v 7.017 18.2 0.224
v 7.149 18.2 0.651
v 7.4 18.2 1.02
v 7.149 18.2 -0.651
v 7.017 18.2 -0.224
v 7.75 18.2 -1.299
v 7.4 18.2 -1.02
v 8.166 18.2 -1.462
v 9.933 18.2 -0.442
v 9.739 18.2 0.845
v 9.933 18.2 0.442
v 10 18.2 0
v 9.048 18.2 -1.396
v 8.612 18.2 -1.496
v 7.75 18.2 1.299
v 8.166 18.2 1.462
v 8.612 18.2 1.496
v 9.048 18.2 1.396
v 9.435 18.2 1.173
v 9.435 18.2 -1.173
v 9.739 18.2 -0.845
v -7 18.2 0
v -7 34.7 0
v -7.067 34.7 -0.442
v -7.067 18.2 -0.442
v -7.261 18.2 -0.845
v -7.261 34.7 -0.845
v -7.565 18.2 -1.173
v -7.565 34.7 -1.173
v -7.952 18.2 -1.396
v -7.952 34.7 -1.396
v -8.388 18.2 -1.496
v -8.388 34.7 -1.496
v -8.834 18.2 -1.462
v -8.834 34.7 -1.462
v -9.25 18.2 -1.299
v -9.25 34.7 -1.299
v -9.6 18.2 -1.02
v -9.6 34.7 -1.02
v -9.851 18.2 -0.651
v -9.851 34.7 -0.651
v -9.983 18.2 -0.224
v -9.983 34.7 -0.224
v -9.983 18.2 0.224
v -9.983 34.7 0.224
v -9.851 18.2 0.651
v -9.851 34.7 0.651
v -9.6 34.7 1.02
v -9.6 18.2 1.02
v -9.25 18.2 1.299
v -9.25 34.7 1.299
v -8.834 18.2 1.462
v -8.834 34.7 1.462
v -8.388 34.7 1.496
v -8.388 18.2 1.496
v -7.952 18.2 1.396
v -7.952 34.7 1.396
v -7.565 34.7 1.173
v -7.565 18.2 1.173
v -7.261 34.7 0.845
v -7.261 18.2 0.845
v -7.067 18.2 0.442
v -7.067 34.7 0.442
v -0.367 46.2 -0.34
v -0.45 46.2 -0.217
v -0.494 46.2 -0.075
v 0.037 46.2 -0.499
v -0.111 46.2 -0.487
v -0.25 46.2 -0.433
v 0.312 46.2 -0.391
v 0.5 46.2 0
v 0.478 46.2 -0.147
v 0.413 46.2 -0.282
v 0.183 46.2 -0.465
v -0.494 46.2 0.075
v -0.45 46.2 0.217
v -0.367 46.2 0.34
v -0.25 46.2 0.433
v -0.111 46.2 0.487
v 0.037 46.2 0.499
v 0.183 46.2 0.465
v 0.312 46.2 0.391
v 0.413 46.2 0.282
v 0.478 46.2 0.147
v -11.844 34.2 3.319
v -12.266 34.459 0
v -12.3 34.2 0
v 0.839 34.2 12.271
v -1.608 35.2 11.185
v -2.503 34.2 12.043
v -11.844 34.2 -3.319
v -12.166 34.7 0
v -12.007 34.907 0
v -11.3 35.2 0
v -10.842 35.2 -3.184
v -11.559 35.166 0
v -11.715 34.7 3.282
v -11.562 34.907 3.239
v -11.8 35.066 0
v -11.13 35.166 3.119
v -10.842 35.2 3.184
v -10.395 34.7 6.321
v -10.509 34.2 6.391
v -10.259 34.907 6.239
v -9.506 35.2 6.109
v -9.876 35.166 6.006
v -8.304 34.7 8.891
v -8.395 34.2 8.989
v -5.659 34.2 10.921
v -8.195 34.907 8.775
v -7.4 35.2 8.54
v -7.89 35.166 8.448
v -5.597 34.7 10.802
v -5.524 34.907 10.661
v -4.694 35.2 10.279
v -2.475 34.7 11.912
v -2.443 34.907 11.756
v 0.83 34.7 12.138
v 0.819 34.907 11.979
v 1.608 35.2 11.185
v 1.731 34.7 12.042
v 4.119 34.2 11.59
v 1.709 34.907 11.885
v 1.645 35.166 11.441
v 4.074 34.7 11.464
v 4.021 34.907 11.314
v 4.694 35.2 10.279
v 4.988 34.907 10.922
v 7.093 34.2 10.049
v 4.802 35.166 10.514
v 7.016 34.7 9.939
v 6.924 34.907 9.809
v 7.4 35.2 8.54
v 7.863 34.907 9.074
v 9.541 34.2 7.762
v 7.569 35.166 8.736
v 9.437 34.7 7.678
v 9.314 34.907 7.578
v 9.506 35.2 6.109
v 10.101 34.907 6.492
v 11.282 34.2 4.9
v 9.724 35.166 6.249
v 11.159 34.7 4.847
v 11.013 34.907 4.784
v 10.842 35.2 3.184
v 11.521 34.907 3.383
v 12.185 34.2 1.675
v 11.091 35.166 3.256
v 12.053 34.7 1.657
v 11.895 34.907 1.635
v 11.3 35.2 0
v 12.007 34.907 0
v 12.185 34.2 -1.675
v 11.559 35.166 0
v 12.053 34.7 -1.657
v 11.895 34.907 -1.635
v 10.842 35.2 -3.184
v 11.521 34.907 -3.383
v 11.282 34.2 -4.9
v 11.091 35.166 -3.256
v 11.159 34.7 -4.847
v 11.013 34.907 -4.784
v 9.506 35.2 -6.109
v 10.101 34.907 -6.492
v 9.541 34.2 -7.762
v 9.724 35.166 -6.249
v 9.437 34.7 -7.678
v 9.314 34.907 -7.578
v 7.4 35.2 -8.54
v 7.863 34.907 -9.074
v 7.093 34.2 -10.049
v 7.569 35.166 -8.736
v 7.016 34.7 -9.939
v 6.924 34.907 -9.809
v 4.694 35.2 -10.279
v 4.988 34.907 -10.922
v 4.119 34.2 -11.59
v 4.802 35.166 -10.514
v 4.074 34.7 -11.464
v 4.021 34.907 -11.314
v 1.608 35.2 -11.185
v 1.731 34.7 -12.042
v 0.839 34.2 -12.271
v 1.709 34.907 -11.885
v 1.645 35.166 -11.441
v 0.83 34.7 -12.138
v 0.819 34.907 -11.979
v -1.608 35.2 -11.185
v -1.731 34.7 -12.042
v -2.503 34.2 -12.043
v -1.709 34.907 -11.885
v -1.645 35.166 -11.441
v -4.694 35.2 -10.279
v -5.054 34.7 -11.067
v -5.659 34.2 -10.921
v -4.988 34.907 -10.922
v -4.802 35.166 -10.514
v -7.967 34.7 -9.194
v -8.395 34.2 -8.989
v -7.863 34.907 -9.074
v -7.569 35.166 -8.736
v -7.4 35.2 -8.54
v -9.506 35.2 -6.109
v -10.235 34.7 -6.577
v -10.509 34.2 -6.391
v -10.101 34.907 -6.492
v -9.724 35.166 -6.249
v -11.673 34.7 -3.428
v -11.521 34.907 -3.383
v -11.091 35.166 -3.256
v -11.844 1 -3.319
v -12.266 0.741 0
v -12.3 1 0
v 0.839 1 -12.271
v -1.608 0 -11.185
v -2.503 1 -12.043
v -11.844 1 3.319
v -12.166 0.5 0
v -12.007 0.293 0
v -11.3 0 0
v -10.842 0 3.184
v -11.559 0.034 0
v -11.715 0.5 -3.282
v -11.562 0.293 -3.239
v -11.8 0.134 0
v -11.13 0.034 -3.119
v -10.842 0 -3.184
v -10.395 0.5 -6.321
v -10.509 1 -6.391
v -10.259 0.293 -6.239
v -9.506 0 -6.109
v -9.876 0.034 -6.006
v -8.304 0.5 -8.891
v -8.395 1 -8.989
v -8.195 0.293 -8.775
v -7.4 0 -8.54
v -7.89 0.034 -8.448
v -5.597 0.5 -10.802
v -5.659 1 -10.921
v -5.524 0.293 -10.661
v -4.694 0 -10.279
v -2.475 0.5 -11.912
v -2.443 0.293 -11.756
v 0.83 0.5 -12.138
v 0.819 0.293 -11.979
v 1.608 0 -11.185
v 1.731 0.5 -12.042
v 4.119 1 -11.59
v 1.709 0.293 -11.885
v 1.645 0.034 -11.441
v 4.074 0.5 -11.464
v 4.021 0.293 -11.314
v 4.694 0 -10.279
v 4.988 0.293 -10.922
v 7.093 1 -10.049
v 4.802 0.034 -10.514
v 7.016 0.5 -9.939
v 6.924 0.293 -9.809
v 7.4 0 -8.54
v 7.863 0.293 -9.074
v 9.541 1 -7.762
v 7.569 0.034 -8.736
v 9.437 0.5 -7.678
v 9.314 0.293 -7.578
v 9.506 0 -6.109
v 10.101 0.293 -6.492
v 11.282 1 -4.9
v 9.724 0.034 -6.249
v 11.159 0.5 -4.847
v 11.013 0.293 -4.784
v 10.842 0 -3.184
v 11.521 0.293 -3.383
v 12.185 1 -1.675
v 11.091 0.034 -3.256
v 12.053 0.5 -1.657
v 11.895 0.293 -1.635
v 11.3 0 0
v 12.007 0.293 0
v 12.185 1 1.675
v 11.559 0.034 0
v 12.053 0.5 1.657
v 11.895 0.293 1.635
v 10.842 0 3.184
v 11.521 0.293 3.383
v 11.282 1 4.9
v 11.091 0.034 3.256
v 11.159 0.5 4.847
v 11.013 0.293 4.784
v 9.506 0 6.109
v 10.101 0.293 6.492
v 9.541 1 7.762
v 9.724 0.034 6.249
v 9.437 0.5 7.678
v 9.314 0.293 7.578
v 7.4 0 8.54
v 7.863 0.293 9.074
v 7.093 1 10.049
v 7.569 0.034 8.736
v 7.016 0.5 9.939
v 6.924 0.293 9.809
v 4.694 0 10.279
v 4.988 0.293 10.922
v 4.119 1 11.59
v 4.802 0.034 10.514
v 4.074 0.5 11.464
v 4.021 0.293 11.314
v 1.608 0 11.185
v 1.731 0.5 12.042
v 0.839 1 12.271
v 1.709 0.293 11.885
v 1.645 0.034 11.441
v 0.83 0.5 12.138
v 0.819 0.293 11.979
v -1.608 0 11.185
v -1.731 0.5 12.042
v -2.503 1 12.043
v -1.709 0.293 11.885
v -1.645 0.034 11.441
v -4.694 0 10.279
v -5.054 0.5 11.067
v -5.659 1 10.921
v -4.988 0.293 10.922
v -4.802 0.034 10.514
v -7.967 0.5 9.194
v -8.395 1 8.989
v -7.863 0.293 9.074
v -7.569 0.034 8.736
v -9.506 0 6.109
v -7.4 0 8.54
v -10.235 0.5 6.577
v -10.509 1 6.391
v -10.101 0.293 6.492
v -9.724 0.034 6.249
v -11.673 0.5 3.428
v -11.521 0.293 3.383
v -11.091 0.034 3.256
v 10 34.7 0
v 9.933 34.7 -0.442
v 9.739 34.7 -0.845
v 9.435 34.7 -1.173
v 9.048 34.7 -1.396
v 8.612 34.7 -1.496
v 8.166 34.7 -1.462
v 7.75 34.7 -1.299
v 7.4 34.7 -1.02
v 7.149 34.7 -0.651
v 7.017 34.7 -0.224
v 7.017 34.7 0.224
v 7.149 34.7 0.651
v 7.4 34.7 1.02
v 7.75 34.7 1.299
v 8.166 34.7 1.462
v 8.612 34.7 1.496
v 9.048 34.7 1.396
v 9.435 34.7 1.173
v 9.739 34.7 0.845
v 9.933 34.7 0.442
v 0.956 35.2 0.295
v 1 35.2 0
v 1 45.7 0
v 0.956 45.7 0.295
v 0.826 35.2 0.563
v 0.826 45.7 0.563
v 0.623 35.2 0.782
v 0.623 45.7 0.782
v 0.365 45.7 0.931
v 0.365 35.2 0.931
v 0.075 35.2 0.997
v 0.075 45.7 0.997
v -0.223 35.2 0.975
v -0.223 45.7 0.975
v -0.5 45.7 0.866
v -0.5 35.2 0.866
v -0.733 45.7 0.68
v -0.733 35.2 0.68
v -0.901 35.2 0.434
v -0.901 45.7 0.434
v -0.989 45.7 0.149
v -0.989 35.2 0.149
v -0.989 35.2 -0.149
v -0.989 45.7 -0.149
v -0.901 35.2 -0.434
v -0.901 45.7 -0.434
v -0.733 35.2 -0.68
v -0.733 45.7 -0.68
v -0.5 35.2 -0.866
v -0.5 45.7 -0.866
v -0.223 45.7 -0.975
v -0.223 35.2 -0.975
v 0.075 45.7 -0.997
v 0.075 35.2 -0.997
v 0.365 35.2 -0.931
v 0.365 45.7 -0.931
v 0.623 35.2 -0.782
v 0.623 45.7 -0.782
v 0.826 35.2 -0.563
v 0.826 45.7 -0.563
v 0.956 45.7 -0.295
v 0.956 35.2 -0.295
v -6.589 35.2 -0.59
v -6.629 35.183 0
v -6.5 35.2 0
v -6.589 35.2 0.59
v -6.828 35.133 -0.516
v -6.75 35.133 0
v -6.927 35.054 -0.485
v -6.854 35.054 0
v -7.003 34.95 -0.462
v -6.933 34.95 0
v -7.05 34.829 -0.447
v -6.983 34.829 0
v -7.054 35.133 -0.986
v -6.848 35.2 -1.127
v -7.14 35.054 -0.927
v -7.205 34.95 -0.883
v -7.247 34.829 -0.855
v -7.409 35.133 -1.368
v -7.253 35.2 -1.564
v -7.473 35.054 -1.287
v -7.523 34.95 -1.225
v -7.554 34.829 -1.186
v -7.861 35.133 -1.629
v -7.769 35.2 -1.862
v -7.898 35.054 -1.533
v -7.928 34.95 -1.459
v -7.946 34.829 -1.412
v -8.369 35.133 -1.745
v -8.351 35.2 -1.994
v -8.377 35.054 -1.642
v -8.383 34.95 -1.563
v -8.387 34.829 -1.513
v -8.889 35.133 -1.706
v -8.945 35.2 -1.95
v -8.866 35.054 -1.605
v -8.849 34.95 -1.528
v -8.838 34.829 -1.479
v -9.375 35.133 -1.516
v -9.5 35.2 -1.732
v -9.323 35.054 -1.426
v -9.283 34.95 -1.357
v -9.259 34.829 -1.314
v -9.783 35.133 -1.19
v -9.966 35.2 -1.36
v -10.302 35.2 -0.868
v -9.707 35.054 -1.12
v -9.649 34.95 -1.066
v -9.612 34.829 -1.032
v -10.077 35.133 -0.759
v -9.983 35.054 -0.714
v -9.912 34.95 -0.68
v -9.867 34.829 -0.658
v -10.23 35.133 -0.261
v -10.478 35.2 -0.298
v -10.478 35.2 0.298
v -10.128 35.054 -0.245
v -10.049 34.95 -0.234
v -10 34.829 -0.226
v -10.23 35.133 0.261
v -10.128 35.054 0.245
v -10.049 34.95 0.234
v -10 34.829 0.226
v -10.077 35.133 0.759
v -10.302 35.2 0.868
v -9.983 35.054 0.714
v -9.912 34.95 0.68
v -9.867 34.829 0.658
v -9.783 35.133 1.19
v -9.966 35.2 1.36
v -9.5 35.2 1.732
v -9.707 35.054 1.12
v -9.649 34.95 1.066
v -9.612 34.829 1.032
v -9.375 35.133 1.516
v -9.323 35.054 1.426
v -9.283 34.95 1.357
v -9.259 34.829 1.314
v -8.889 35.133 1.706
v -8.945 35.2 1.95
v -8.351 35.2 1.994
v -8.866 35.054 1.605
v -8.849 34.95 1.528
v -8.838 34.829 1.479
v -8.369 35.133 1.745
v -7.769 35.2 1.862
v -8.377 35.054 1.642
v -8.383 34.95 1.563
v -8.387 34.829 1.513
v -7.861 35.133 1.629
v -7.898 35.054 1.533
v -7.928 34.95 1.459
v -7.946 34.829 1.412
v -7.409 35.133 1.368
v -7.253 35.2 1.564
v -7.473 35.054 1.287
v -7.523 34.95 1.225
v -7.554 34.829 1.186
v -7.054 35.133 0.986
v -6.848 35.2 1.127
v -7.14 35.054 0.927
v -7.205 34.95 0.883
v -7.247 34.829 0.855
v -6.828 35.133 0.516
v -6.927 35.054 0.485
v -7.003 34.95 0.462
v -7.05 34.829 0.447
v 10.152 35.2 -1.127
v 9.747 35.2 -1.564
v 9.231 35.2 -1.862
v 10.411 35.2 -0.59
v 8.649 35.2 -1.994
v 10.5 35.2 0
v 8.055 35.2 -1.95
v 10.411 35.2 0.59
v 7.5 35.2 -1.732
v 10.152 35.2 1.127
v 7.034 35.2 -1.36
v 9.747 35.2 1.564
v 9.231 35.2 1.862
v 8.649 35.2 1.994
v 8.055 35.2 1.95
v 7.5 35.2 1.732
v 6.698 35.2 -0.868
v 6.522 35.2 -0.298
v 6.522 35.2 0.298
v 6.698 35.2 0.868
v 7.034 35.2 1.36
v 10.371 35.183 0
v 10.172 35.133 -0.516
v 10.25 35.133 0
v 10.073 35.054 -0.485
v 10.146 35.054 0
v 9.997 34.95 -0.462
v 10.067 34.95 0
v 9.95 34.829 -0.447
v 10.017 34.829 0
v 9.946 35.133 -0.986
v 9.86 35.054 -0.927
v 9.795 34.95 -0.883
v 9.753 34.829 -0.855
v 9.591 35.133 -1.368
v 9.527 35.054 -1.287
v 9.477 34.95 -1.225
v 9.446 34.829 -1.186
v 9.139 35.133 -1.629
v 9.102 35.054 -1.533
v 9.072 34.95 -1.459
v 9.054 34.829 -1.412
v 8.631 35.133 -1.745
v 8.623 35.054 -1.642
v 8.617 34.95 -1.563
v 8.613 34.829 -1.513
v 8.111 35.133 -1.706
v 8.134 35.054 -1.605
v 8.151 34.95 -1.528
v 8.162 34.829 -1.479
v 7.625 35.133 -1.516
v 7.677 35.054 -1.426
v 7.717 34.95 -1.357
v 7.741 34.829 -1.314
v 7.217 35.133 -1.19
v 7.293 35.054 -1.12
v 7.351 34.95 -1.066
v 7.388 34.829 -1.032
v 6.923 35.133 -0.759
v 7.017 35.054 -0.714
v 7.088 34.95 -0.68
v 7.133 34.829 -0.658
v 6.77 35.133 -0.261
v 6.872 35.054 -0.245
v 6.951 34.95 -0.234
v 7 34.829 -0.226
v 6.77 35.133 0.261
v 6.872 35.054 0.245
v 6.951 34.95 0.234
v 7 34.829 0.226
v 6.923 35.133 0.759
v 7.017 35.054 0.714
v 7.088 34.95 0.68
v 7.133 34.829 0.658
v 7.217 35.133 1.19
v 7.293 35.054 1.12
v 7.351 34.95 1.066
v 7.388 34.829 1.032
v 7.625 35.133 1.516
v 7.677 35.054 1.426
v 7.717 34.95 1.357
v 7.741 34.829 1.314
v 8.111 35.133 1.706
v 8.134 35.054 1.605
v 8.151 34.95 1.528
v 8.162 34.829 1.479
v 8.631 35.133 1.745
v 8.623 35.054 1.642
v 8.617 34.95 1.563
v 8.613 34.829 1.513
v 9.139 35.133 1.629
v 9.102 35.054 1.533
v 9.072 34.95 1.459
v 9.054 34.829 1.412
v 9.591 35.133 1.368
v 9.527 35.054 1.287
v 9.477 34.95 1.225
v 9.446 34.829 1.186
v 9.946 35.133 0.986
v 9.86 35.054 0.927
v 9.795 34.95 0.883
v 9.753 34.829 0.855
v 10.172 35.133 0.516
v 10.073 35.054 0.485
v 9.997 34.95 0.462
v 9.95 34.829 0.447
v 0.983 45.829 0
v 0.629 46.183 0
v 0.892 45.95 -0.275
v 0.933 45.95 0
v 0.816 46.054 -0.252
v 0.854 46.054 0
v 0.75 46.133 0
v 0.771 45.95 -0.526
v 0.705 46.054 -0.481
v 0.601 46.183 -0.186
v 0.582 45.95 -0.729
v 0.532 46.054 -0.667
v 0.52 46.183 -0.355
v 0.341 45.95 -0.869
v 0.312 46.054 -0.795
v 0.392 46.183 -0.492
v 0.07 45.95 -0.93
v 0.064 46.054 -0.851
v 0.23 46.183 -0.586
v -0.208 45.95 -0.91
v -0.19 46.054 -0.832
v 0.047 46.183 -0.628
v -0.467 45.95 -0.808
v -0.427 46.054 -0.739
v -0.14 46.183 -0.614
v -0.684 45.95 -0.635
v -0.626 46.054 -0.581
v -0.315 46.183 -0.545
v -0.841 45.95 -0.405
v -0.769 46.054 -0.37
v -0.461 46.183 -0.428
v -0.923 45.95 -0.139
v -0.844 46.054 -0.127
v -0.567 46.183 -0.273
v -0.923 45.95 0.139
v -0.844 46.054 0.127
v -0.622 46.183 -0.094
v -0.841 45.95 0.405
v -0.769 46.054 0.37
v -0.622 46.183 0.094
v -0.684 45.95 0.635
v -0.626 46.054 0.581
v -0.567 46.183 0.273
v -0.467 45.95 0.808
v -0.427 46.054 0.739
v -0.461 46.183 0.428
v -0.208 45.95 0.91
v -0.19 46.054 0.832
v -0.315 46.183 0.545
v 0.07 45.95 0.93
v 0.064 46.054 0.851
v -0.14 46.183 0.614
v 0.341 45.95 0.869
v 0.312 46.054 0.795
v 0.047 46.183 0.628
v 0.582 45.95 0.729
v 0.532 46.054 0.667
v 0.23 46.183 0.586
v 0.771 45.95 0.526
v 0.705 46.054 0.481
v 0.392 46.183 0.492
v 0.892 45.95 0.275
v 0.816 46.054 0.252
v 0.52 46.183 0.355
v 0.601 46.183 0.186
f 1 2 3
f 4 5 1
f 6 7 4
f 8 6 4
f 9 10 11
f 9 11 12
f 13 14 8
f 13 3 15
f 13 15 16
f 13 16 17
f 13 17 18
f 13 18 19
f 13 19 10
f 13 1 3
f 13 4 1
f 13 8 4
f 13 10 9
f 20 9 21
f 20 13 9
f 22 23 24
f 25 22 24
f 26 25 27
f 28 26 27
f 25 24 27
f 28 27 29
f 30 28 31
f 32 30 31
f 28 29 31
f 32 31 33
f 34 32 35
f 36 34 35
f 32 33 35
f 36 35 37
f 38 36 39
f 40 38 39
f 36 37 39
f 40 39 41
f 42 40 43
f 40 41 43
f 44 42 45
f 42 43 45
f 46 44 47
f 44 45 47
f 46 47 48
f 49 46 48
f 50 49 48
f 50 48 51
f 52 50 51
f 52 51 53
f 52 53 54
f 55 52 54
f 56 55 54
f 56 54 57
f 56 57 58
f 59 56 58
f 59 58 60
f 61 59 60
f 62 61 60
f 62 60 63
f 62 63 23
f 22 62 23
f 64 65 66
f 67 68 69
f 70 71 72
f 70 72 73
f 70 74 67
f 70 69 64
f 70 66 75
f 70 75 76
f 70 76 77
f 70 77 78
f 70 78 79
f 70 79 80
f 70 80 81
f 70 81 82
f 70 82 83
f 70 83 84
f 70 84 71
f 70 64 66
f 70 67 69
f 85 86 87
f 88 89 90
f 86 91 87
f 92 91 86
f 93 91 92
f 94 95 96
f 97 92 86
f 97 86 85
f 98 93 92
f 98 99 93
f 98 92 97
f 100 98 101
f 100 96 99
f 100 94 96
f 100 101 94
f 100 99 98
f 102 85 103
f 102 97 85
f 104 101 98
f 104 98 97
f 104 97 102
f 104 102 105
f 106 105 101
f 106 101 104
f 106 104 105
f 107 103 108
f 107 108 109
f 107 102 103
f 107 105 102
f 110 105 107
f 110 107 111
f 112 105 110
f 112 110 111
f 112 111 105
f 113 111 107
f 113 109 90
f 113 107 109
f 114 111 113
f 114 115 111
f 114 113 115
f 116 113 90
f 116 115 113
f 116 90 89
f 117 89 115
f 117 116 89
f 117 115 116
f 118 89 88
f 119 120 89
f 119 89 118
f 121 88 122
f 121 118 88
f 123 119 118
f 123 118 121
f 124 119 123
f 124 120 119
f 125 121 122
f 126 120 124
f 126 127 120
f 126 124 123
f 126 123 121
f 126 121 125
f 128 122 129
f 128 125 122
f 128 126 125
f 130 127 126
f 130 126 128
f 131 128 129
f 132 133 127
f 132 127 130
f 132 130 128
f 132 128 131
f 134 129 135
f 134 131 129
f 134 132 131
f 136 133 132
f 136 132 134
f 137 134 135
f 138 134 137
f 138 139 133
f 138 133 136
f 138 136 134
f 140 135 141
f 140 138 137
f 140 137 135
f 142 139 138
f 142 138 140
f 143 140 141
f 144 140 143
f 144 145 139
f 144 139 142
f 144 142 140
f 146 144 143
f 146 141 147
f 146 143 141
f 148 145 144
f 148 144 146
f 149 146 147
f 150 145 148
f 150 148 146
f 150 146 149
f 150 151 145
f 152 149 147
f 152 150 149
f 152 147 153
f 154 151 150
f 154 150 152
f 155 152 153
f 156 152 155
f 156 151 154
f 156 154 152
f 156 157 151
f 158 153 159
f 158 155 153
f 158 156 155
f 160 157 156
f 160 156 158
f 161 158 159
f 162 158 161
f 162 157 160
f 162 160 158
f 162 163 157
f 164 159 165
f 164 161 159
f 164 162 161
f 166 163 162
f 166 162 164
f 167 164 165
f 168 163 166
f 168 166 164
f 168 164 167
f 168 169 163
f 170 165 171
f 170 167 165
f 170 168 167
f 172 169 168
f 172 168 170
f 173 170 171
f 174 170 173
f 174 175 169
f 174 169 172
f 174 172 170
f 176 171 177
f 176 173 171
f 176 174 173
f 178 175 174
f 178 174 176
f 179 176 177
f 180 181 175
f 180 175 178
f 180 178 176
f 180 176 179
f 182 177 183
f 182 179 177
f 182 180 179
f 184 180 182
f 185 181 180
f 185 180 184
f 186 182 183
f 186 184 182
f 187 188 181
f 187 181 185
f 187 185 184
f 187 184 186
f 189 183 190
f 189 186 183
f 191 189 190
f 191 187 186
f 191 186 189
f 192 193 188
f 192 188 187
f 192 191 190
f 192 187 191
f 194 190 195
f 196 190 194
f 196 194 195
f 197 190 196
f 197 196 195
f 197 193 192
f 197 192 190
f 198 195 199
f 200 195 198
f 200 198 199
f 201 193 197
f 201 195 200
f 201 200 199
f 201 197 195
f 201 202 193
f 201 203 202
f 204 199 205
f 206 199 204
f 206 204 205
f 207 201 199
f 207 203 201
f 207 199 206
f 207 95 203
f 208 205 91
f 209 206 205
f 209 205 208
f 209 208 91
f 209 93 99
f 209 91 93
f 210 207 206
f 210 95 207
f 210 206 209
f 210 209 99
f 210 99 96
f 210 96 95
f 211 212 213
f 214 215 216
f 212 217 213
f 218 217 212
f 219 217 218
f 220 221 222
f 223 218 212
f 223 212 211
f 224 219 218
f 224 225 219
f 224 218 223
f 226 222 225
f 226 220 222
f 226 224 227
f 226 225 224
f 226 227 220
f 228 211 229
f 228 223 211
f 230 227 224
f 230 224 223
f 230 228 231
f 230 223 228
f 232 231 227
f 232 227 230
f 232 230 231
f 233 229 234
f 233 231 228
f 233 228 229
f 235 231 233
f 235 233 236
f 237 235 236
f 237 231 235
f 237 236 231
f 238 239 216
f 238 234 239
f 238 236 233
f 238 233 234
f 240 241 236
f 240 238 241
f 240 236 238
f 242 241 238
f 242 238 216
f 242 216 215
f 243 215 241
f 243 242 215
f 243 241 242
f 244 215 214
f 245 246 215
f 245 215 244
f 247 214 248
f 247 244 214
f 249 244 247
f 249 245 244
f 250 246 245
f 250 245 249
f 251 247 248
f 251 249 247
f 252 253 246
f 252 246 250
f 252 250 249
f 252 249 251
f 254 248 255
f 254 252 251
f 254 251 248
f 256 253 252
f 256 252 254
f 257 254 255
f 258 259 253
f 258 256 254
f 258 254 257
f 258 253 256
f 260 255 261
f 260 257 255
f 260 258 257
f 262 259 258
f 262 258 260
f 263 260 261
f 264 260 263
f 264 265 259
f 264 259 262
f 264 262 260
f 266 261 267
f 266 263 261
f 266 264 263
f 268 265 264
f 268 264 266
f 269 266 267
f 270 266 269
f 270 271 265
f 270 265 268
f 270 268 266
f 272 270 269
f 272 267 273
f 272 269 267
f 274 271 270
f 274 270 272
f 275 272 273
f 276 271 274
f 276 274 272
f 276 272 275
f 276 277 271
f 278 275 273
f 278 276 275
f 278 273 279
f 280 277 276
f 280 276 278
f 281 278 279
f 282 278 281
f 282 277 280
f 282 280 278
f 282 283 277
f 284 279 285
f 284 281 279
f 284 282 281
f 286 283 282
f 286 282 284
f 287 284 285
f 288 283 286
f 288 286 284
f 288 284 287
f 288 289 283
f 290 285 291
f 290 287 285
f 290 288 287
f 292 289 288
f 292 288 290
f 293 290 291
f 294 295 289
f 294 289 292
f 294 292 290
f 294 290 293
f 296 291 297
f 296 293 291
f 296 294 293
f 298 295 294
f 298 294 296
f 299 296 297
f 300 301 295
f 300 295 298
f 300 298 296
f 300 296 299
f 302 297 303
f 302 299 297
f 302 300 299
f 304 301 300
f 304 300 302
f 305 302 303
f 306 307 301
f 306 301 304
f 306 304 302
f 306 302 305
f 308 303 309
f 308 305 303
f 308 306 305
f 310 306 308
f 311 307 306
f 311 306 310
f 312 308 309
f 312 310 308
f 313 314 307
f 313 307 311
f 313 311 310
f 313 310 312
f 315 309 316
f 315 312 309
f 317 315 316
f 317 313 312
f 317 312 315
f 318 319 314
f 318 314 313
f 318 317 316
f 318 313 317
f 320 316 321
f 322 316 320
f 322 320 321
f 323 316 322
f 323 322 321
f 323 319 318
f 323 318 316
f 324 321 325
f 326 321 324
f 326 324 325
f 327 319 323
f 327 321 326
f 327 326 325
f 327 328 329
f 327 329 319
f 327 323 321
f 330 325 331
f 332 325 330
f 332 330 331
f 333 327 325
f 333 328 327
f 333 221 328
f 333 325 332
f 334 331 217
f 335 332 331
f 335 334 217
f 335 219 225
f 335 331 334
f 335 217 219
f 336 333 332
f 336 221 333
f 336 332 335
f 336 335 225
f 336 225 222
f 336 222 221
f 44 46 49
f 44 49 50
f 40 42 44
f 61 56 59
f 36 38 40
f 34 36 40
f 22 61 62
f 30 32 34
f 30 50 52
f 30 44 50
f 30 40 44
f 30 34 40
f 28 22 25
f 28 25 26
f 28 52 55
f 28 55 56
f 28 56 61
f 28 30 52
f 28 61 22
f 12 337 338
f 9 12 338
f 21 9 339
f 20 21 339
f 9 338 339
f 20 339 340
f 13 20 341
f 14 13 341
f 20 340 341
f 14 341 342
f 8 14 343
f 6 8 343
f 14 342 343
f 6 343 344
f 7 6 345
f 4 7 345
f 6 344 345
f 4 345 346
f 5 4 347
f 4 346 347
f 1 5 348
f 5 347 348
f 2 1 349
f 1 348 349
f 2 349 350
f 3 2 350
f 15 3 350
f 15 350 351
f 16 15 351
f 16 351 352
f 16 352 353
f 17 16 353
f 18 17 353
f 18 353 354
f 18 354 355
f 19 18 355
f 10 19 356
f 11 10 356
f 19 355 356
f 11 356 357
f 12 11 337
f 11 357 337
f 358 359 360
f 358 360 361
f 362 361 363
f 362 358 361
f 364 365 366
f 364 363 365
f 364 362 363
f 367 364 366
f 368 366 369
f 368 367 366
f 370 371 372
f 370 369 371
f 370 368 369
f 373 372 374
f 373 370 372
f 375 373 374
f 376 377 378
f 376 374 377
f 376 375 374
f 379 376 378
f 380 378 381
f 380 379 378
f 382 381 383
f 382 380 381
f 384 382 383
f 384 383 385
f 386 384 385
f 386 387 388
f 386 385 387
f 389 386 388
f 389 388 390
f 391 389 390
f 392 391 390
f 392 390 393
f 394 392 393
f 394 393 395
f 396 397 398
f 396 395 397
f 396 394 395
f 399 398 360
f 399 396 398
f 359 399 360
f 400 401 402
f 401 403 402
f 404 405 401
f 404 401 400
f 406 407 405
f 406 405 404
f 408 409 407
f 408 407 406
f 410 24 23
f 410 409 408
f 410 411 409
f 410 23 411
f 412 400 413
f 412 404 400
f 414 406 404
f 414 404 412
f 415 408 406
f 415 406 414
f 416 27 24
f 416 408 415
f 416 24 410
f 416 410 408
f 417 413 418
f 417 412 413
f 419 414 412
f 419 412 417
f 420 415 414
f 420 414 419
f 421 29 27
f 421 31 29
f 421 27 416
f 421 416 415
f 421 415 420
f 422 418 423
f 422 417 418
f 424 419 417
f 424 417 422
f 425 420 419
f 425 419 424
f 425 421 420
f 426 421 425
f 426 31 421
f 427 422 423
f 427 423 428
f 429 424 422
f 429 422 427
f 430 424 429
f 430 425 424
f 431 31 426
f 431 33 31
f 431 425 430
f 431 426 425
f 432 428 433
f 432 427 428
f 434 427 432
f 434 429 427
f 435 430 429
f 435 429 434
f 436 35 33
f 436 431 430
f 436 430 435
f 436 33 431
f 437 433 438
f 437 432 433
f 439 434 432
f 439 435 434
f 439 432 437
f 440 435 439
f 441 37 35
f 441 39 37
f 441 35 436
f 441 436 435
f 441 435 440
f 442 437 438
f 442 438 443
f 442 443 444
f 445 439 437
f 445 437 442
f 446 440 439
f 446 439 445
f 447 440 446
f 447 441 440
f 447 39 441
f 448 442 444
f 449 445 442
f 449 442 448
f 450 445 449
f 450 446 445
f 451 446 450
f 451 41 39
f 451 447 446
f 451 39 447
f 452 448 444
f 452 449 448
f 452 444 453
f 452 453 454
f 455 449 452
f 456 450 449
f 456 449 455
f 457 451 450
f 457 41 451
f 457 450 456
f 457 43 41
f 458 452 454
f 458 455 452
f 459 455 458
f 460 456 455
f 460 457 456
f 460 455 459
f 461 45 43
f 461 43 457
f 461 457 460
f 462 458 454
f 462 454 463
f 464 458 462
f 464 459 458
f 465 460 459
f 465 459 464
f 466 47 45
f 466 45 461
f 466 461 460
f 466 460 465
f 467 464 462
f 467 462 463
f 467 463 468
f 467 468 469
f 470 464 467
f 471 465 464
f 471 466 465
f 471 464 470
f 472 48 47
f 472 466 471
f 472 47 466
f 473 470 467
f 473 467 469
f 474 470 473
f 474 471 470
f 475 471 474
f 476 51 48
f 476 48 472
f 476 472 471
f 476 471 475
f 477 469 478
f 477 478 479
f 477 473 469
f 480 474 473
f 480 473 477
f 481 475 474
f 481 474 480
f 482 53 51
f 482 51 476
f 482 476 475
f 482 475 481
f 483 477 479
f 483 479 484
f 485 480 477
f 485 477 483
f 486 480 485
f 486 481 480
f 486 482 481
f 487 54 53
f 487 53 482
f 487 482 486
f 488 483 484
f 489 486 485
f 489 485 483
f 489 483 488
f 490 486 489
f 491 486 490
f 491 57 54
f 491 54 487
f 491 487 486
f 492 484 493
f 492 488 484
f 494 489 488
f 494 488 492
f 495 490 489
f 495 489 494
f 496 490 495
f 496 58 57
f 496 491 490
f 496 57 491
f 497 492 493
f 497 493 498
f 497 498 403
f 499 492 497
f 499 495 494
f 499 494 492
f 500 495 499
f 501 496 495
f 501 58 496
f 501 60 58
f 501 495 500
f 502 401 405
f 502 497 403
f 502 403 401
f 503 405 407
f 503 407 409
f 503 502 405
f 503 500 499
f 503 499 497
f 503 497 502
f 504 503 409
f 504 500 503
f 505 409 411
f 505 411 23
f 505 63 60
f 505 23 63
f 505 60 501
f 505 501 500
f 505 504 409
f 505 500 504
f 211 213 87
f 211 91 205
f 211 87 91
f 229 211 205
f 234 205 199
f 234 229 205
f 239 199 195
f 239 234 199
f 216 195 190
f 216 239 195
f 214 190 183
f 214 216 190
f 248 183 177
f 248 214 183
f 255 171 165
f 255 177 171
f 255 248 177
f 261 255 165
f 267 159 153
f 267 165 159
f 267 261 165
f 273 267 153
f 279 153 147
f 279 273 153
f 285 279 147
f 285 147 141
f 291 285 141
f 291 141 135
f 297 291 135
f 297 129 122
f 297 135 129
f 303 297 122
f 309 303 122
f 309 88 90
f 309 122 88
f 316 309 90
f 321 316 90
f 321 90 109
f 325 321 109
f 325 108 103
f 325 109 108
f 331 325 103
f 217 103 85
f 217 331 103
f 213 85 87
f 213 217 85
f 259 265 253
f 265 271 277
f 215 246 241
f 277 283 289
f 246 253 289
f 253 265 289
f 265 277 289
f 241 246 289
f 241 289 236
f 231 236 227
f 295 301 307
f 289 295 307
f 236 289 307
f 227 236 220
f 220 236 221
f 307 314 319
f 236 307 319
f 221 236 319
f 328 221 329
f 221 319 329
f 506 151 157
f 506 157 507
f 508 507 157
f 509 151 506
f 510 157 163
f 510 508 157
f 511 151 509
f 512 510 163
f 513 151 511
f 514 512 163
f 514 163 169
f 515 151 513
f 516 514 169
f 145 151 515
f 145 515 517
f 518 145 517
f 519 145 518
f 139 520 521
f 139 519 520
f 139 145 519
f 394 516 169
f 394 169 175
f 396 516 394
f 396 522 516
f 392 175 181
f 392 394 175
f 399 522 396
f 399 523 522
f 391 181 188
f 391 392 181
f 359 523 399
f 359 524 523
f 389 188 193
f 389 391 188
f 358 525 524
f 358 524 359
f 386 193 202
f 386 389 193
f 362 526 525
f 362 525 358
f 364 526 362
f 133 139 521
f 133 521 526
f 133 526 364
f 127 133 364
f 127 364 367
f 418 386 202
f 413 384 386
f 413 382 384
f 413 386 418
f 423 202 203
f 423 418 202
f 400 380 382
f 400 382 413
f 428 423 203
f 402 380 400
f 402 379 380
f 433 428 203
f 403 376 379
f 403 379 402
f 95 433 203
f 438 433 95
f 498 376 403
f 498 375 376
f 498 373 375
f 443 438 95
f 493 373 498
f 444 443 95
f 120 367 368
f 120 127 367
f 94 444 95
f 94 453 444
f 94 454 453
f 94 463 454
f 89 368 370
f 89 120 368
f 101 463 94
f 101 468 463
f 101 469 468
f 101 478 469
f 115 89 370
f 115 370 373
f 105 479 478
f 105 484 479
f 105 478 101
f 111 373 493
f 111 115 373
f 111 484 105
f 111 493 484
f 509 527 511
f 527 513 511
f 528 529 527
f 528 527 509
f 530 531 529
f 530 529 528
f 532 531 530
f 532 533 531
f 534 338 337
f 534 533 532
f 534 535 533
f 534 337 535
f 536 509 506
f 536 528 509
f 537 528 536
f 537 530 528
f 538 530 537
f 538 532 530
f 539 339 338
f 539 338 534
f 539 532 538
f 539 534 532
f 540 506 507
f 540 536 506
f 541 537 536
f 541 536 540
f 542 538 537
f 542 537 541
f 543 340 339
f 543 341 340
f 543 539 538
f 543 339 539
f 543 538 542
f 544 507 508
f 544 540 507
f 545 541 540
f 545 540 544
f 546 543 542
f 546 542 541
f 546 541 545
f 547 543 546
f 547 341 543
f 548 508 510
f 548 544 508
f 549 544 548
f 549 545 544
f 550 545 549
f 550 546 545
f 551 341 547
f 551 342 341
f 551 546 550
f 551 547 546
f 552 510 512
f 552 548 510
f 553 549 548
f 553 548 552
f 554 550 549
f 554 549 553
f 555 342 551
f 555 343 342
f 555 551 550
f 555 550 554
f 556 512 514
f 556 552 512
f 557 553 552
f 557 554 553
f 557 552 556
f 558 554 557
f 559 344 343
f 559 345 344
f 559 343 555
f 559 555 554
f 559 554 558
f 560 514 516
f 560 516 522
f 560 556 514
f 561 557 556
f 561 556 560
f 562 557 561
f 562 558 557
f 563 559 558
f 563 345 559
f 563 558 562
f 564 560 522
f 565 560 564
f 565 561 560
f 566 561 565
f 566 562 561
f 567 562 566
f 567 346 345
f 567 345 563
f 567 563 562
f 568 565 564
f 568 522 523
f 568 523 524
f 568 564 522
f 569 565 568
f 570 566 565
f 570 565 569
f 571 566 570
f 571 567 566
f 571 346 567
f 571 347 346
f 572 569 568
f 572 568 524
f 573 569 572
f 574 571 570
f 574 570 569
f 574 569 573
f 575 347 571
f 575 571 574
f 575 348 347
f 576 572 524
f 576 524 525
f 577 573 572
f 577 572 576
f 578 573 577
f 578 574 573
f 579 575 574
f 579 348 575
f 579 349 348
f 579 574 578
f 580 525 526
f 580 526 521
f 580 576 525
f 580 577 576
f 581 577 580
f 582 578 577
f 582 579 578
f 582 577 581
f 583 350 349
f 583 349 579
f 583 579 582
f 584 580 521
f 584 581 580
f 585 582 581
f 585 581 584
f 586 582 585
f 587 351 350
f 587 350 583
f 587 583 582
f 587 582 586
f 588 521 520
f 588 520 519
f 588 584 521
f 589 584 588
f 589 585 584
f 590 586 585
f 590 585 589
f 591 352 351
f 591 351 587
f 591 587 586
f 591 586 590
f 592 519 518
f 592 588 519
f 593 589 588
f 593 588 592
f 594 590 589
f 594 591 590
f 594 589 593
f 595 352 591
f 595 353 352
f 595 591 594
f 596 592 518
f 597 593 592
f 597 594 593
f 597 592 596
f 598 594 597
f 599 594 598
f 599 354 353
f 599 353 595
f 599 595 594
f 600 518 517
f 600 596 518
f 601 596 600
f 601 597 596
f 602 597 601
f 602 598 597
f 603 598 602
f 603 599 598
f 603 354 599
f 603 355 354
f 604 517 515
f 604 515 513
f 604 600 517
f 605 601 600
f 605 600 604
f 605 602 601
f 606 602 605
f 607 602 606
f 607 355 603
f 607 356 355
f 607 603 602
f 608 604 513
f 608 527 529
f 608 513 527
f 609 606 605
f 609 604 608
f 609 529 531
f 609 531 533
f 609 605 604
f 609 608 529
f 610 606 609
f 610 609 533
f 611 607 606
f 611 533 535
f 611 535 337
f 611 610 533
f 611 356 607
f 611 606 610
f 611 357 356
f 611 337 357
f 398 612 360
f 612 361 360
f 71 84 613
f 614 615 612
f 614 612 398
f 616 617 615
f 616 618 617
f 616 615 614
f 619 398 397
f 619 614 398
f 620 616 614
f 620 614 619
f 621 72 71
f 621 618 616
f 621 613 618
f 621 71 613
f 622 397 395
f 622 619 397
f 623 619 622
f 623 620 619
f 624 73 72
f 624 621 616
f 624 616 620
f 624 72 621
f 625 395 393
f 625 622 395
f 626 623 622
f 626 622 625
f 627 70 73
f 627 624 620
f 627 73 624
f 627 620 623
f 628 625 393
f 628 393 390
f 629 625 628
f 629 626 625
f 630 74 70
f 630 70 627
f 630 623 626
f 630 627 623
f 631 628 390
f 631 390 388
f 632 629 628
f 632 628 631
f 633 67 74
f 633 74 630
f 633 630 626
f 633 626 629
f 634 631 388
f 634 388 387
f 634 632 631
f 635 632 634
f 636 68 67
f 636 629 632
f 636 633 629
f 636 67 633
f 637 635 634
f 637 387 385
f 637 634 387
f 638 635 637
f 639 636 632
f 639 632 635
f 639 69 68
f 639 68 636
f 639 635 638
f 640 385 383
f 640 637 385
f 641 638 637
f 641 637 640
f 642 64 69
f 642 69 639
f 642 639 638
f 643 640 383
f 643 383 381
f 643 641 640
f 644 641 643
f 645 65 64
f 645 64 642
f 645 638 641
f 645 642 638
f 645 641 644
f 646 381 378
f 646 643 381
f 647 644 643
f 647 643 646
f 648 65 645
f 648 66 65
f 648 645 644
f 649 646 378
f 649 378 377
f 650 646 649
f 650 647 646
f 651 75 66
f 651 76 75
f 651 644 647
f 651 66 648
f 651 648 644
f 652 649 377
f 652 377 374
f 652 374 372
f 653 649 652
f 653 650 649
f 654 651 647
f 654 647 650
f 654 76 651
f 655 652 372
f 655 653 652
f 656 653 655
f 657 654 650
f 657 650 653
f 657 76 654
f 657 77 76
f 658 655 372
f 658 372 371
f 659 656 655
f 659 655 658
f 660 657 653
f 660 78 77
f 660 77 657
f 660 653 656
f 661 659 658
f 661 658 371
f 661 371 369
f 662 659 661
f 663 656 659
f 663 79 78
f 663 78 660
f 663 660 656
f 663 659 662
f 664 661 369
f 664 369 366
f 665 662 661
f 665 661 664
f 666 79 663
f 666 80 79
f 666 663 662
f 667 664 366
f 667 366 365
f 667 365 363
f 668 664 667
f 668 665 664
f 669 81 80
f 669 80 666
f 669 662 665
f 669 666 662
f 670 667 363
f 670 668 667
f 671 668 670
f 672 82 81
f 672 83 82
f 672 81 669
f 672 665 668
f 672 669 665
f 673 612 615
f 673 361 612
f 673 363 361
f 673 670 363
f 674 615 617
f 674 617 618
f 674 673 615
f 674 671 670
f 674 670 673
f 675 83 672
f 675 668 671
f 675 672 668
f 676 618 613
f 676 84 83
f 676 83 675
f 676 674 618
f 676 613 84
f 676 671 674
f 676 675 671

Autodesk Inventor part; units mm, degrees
ref_plane "YZ Plane" through (0, 0, 0) normal (1, 0, 0) x (0, 1, 0)
ref_plane "XZ Plane" through (0, 0, 0) normal (0, 1, 0) x (-1, 0, 0)
ref_plane "XY Plane" through (0, 0, 0) normal (0, 0, 1) x (1, 0, 0)
sketch "Sketch2" plane through (0, 0, 0) normal (0, 1, 0) x (-1, 0, 0)
  circle A0 centre (0, 0) radius 12.3
  dimension "d1" = 24.6
extrude "Extrusion1" add sketch "Sketch2" along normal blind 35.2
sketch "Sketch3" plane through (0, 35.2, 0) normal (0, 1, 0) x (1, 0, 0)
  circle A0 centre (0, 0) radius 1
  dimension "d4" = 2
extrude "Extrusion2" add sketch "Sketch3" along normal blind 11
sketch "Sketch4" plane through (0, 35.2, 0) normal (0, 1, 0) x (1, 0, 0)
  circle A0 centre (-8.5, 0) radius 1.5
  circle A1 centre (8.5, 0) radius 1.5
  point P0 (0, 0)
  dimension "d7" = 3
  dimension "d9" = 8.5
  dimension "d13" = 360
extrude "Extrusion3" cut sketch "Sketch4" against normal blind 17
fillet "Fillet1" radius 1 2 edges at (12.3, 35.2, 0) (12.3, 0, 0)
fillet "Fillet1" radius 0.5 3 edges at (7, 35.2, 0) (-1, 46.2, 0) (-10, 35.2, 0)
properties part number "RS-385 Dc Electric Motor"
